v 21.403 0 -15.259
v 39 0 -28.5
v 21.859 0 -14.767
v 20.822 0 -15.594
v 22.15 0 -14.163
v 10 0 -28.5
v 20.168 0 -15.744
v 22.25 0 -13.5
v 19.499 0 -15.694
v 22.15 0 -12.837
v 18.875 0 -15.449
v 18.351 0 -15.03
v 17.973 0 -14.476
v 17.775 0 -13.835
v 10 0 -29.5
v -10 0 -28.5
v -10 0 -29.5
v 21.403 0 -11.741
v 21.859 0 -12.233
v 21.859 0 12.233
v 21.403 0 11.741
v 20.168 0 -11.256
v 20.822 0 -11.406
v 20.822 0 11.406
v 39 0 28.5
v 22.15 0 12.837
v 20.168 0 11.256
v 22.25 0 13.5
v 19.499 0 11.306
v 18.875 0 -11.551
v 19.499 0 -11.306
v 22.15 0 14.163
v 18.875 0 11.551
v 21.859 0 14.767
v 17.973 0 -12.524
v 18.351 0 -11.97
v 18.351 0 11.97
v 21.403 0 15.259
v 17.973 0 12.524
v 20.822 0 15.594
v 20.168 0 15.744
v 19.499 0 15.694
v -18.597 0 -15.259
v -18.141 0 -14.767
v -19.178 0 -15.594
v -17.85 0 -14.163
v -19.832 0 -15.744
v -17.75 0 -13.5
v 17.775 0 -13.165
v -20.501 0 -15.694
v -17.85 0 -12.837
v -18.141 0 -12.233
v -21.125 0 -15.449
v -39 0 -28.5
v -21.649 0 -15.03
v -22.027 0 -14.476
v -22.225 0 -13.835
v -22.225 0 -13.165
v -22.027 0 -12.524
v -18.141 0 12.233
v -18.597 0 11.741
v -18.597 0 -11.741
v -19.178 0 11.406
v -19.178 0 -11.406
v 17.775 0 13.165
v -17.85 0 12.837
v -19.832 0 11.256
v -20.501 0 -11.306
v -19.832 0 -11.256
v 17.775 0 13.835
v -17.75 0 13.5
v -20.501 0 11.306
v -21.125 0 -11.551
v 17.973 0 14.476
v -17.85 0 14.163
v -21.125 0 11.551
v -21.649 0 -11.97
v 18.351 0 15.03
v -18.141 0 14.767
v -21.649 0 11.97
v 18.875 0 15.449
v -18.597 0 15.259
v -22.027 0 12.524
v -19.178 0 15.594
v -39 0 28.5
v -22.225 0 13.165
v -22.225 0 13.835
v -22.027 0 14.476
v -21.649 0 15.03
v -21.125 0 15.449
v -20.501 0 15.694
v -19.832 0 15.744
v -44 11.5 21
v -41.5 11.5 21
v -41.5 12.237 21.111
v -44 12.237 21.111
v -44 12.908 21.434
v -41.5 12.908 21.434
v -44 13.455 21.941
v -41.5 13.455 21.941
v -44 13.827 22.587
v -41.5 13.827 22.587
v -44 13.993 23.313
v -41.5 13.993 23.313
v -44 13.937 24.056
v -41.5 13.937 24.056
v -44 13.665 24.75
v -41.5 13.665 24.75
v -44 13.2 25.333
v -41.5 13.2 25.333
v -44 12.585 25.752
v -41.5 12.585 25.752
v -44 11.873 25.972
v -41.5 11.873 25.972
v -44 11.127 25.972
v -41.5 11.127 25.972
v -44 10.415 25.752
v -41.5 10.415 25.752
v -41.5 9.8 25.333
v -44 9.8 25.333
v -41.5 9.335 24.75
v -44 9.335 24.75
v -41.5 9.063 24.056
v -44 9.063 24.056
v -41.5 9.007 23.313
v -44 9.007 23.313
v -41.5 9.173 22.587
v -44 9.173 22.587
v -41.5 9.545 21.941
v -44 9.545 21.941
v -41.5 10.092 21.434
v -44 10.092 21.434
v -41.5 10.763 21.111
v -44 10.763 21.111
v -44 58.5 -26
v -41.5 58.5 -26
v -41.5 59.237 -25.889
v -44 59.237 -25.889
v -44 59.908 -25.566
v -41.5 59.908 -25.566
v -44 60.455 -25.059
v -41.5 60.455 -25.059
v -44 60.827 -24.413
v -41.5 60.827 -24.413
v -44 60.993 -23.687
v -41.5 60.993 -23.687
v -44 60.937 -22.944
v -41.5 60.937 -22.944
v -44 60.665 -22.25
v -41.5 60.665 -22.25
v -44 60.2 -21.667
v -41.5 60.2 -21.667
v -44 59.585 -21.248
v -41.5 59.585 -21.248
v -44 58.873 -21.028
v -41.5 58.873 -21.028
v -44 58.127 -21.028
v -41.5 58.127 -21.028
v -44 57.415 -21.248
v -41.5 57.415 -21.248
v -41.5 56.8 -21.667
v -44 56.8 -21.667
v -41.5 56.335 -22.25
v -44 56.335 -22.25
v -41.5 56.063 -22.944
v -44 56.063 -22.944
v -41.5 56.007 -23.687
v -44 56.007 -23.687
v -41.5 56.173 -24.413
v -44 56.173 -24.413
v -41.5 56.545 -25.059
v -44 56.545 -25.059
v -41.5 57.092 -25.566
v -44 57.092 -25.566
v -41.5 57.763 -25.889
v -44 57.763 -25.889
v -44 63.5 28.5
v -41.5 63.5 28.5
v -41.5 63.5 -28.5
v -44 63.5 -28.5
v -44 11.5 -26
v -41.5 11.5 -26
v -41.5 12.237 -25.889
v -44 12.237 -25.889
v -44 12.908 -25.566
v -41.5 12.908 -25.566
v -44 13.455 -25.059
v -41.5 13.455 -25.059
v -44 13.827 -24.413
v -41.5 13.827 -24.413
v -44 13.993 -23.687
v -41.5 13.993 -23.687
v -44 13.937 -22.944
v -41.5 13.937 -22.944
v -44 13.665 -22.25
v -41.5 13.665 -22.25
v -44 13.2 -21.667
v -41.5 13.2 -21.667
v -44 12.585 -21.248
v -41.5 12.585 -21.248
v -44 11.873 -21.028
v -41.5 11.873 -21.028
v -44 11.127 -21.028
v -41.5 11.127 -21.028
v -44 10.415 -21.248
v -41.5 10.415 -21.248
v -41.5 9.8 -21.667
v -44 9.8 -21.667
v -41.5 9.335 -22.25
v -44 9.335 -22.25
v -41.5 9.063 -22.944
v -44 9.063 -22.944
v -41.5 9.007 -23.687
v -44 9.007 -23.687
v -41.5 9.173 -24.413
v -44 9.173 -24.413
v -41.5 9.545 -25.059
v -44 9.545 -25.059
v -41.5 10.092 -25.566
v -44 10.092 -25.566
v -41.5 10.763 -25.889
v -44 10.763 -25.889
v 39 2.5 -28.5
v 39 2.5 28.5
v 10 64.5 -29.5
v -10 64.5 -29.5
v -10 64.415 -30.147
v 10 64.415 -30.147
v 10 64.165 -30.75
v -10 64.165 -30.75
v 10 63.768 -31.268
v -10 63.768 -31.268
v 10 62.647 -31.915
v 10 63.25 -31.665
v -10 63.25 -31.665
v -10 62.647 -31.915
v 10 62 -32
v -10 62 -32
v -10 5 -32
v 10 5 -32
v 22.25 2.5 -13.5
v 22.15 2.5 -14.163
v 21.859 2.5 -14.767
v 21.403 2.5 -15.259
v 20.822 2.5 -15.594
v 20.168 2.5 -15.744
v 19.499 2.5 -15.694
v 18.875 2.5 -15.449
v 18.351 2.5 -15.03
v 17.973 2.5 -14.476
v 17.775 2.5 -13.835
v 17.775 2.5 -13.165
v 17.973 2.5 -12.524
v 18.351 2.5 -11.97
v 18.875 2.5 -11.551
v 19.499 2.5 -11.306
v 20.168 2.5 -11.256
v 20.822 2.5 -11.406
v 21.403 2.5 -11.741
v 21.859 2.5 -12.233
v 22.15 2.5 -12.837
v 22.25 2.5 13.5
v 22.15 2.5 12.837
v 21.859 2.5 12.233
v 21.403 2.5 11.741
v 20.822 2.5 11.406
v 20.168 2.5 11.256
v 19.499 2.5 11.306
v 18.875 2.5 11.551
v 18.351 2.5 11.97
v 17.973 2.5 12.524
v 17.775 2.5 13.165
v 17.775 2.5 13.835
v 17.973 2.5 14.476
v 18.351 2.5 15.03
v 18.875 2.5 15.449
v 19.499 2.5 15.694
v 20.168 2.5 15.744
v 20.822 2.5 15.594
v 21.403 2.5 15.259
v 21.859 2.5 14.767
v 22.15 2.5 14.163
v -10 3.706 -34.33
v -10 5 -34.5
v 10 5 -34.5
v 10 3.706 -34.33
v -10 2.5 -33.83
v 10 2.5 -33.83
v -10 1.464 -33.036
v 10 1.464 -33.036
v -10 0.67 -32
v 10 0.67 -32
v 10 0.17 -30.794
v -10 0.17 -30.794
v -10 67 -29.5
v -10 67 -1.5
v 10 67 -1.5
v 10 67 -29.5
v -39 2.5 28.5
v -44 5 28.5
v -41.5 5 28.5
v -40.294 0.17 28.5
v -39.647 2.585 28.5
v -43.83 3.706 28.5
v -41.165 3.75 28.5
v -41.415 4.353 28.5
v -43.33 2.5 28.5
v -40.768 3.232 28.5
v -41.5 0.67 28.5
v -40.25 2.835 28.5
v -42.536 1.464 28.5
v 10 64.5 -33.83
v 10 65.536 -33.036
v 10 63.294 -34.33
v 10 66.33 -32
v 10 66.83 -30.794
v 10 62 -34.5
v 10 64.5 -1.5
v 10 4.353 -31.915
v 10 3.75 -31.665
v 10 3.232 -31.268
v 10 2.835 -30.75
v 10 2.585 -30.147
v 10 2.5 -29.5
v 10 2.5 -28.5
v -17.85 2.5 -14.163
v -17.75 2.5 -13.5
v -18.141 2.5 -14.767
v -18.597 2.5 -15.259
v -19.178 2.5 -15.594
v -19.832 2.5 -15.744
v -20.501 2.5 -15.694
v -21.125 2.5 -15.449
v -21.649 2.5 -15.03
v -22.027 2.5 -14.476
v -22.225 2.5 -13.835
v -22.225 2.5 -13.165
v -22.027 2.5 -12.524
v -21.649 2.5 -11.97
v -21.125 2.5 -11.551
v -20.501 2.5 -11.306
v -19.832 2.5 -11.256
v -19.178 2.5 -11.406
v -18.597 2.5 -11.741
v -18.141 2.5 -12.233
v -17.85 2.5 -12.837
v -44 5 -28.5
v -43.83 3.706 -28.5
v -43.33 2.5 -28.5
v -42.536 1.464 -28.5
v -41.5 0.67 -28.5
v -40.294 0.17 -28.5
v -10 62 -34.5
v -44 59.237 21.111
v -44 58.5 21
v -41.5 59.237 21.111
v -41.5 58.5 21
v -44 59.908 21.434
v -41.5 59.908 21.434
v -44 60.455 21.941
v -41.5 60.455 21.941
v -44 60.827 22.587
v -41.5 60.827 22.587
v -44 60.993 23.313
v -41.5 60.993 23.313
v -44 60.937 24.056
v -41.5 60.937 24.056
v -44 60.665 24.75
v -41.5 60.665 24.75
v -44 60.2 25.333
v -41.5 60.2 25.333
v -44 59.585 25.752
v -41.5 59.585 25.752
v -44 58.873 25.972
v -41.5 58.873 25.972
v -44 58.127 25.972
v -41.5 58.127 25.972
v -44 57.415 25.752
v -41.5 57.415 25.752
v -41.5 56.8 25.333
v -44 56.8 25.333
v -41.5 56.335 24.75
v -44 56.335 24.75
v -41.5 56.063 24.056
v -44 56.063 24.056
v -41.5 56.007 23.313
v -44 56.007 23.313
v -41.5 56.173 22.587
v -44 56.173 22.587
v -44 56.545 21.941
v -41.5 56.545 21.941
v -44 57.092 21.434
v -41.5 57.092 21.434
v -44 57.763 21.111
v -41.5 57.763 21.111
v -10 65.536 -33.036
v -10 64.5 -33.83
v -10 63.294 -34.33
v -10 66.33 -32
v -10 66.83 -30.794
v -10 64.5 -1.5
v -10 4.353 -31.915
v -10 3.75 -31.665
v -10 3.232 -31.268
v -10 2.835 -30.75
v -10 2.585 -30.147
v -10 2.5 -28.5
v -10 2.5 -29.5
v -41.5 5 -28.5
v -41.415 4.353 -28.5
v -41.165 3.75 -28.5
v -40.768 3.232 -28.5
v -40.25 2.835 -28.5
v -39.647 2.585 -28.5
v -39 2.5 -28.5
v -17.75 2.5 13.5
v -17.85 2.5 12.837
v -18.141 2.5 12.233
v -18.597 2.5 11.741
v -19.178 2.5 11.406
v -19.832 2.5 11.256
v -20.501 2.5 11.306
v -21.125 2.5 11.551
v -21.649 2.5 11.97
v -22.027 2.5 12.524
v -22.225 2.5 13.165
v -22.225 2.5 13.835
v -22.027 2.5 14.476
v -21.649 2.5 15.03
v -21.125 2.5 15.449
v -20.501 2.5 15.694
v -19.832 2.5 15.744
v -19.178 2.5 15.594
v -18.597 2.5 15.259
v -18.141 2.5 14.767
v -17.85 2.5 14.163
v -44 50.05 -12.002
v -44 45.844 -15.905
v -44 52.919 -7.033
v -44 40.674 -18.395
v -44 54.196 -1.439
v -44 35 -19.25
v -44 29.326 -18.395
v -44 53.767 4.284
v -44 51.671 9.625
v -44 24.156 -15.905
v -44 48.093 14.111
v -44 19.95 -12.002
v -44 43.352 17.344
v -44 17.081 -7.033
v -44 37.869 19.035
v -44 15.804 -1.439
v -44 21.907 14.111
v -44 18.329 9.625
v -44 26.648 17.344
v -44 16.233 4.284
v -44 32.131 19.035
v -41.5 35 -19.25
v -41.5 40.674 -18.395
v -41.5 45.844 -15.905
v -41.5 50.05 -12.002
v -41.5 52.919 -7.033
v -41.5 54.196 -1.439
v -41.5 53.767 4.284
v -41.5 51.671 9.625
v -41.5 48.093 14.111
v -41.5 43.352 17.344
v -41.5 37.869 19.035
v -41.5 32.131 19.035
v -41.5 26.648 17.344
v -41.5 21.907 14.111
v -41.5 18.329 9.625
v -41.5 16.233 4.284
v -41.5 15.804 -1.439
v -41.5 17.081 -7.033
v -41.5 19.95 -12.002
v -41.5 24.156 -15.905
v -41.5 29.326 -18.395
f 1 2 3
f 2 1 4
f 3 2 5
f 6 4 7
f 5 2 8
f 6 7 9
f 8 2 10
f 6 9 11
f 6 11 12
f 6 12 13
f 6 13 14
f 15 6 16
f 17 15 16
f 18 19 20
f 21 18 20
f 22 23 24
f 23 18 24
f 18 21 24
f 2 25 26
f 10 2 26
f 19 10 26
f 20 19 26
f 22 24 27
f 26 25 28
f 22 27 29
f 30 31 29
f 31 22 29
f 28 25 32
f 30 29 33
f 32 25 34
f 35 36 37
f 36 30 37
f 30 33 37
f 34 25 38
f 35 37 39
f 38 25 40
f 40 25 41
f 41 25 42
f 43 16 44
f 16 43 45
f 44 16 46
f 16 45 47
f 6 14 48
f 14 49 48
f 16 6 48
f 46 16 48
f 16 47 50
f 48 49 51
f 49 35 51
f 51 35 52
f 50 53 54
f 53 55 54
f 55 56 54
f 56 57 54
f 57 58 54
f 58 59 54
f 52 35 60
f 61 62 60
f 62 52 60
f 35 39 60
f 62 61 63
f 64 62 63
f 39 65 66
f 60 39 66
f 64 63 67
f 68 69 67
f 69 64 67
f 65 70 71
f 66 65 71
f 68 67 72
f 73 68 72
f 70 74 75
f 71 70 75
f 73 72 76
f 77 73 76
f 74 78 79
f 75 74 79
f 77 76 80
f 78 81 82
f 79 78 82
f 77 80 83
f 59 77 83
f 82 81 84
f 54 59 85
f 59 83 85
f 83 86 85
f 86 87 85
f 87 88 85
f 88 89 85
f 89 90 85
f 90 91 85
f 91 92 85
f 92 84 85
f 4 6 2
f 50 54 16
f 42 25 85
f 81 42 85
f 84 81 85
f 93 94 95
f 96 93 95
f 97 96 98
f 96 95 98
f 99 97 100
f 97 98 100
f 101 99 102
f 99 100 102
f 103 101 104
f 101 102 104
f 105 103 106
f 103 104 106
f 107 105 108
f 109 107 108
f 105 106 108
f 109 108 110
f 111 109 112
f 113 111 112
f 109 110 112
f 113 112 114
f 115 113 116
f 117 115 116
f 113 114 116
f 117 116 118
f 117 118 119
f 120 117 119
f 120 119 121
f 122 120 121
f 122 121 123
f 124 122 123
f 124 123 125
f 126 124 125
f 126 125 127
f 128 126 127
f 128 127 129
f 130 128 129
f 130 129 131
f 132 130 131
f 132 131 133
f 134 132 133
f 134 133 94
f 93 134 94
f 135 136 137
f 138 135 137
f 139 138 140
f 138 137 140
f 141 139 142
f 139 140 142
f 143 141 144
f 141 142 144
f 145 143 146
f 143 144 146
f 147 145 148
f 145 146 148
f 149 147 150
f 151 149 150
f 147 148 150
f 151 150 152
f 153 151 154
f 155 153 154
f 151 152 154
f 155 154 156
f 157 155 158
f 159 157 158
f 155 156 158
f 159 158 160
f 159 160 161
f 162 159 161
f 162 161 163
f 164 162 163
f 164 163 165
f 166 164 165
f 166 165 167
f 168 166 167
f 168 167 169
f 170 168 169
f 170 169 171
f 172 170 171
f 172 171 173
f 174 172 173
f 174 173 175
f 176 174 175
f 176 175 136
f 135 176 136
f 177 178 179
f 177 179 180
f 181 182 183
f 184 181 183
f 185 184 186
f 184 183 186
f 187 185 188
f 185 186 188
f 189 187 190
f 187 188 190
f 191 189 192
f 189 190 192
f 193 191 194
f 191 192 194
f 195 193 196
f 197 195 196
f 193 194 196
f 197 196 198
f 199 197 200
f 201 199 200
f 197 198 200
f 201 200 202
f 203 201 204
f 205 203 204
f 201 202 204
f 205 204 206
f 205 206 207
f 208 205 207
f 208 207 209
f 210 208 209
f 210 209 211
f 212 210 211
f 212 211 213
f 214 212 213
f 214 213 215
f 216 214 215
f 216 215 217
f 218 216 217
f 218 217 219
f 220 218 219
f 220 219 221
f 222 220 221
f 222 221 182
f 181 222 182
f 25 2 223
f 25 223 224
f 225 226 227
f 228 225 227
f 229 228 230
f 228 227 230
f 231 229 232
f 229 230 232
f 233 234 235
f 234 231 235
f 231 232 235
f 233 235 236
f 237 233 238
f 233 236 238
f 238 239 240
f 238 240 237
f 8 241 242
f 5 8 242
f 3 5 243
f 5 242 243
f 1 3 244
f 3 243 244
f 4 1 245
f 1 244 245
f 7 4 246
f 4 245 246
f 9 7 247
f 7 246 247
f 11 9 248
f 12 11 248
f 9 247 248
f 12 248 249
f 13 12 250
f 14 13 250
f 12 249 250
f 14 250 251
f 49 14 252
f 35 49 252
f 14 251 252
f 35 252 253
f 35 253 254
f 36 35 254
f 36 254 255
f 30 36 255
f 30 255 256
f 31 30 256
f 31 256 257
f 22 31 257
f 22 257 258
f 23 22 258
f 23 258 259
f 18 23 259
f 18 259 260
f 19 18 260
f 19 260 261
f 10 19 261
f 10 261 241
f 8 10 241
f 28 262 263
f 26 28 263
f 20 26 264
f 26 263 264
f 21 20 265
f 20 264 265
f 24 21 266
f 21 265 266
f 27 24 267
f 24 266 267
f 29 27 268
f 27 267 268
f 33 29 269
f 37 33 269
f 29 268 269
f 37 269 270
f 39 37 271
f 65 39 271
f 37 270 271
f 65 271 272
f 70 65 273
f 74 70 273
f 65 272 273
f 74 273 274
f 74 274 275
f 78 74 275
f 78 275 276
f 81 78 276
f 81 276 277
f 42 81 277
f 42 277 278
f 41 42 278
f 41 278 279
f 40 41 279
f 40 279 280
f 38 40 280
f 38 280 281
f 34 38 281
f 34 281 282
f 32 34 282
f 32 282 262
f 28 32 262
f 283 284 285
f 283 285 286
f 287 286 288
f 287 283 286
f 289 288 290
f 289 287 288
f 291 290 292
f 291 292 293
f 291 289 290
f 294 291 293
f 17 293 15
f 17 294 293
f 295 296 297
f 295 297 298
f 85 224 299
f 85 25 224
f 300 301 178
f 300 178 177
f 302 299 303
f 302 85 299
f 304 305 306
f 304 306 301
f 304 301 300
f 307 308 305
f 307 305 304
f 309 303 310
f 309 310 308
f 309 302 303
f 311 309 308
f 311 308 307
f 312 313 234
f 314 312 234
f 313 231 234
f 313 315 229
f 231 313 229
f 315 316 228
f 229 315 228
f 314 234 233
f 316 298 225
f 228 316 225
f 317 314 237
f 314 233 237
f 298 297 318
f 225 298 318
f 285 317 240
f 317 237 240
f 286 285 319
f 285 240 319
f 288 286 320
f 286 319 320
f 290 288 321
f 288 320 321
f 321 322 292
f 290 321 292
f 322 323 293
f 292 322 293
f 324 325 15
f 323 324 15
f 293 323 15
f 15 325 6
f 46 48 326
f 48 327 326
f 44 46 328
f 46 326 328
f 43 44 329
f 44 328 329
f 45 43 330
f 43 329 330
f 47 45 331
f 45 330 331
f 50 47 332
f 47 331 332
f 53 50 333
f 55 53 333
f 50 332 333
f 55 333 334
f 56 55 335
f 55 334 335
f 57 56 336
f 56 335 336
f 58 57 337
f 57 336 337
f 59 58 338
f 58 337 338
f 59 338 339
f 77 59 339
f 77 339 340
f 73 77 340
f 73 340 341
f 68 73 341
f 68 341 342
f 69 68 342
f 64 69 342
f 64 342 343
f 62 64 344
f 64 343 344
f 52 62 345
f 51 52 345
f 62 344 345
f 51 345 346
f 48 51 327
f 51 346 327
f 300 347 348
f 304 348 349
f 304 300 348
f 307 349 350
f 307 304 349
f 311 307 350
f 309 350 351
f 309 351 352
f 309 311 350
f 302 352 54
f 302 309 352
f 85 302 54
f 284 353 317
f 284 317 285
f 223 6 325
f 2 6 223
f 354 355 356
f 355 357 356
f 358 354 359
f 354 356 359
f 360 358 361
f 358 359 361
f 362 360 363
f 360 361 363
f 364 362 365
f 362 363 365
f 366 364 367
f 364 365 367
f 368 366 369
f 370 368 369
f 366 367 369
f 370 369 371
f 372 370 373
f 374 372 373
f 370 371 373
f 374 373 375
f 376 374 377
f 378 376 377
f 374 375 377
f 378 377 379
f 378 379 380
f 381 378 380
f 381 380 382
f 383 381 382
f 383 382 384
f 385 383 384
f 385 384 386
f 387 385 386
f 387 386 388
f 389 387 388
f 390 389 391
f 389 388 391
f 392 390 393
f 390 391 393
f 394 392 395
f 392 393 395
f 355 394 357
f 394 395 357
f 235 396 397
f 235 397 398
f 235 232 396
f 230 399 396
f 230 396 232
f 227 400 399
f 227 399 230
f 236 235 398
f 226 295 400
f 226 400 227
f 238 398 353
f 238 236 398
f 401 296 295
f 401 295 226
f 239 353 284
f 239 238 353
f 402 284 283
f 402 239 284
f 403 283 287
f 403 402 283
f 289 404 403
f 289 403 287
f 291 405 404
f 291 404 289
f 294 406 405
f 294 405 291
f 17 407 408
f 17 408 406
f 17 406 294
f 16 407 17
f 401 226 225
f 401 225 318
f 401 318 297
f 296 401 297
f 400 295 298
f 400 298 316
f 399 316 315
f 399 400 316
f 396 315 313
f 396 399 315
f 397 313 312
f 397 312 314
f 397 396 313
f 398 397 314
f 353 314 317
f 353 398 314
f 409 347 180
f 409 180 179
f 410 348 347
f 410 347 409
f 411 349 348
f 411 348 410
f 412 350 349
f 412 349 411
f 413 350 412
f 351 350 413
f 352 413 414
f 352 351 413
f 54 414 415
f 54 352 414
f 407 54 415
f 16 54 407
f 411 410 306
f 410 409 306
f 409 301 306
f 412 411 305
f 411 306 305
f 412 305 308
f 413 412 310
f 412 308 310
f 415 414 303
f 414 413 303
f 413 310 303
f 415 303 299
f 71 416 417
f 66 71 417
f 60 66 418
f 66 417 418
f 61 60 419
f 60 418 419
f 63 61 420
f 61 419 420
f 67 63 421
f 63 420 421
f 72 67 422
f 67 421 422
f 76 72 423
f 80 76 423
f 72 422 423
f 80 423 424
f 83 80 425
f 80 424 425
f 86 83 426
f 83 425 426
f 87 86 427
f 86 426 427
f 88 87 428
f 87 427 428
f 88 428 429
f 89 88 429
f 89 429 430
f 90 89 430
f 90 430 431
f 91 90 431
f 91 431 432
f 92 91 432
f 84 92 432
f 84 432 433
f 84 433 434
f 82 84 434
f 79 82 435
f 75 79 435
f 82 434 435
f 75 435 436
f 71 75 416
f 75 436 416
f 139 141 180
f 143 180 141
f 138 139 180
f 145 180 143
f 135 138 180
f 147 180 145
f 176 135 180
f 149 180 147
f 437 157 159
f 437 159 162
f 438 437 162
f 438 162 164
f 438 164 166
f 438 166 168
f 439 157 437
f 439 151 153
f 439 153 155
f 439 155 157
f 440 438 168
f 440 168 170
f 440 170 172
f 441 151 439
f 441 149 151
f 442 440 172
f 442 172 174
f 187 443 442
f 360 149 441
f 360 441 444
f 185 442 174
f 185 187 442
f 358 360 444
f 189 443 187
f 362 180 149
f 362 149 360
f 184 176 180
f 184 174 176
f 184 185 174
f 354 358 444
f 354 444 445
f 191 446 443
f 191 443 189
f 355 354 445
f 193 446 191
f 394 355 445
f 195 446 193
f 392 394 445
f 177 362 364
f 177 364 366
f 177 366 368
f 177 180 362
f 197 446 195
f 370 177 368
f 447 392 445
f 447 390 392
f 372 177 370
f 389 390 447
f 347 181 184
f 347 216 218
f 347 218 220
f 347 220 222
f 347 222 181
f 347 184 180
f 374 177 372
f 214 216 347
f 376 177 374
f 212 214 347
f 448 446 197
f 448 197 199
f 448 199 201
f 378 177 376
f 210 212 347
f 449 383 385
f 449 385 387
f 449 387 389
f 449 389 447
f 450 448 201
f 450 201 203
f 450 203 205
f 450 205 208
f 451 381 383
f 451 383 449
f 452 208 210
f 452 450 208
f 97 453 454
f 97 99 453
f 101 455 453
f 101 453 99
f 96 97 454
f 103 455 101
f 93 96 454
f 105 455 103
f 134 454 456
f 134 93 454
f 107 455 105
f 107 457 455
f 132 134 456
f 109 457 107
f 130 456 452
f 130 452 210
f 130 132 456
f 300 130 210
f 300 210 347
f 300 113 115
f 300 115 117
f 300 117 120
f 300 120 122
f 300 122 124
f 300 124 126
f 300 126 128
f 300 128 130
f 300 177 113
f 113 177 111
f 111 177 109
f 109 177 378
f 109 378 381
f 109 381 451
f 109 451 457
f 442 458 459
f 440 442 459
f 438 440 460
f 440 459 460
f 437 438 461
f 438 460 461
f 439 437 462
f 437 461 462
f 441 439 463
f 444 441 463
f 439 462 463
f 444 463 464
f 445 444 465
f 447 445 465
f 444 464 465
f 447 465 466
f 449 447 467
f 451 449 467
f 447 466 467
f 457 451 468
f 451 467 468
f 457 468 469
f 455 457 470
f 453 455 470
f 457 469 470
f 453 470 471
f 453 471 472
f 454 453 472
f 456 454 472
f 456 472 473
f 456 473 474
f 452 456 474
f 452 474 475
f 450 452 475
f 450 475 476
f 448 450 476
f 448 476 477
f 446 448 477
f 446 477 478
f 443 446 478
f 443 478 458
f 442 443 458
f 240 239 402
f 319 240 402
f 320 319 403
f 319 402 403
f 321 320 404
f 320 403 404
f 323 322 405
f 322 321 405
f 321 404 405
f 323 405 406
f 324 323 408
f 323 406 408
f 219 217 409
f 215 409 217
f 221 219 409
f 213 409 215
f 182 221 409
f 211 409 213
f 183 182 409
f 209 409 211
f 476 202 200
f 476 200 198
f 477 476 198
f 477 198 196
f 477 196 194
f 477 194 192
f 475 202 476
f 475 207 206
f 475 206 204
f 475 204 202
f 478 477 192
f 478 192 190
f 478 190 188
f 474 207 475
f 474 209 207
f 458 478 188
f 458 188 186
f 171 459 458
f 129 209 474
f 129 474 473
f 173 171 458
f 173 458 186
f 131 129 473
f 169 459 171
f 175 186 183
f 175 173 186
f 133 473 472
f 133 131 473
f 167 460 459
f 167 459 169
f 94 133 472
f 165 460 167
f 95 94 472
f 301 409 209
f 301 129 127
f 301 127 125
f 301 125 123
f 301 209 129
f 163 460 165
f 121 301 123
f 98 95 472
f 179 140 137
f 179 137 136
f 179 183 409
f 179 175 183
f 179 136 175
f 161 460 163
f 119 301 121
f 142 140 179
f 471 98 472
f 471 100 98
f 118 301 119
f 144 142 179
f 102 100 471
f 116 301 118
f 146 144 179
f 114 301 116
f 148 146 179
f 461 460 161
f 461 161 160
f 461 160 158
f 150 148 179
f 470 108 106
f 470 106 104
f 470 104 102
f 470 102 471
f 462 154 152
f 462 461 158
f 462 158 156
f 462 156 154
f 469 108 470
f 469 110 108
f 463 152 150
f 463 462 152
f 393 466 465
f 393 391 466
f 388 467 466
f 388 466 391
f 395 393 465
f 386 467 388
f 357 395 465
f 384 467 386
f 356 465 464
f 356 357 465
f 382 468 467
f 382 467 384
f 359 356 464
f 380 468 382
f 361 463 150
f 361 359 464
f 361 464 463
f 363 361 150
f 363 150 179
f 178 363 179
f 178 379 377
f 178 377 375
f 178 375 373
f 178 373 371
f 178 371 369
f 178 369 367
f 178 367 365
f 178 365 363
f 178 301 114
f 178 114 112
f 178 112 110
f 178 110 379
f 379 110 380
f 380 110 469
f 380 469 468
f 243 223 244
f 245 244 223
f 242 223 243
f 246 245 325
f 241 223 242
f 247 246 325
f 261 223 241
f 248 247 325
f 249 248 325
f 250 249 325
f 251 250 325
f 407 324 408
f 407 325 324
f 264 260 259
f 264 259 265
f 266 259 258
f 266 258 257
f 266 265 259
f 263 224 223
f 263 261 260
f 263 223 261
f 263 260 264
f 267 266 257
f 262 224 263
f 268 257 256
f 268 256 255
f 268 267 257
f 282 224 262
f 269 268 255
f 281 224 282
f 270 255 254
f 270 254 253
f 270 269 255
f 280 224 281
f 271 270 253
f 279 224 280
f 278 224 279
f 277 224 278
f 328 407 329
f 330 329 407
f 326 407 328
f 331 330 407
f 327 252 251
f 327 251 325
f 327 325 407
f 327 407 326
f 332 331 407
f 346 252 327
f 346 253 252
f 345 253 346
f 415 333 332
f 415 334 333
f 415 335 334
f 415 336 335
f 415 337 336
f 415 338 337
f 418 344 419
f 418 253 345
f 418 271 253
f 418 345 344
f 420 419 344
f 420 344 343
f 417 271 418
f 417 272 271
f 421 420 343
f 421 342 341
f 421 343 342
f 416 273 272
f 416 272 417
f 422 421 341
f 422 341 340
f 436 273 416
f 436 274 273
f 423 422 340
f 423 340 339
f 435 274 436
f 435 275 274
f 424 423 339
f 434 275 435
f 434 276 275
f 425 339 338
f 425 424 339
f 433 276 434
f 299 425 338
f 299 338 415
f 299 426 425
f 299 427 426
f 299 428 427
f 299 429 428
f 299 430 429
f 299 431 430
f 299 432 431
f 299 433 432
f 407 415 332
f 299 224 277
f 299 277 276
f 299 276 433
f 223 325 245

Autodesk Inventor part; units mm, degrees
ref_plane "YZ Plane" through (0, 0, 0) normal (1, 0, 0) x (0, 1, 0)
ref_plane "XZ Plane" through (0, 0, 0) normal (0, 1, 0) x (-1, 0, 0)
ref_plane "XY Plane" through (0, 0, 0) normal (0, 0, 1) x (1, 0, 0)
sketch "Sketch1" plane through (0, 0, 0) normal (0, 1, 0) x (-1, 0, 0)
  line L0 (39, -28.5) -> (-39, -28.5)
  line L1 (-39, -28.5) -> (-39, 28.5)
  line L2 (-39, 28.5) -> (39, 28.5)
  line L3 (39, 28.5) -> (39, -28.5)
  line L4 (39, -28.5) -> (-39, 28.5) construction
  line L5 (-39, -28.5) -> (39, 28.5) construction
  point P0 (0, 0)
  dimension "d0" = 78
  dimension "d1" = 57
extrude "Plate1" add sketch "Sketch1" along normal blind 2.5
sketch "Sketch2" plane through (-41.5, 5, 28.5) normal (-1, 0, 0) x (0, -1, 0)
  line L0 (0, -57) -> (0, 0)
  line L1 (0, 0) -> (-58.5, 0)
  line L2 (-58.5, 0) -> (-58.5, -57)
  line L3 (-58.5, -57) -> (0, -57)
edge flange "Flange1" height 63.5 angle 90 thickness 2.5 bend radius 2.5 thickness toward (-1, 0, 0) relief tear relief width 2.5 relief depth 1.25 edges at (-39, 2.5, 0) wall of the first edge with corners at (-41.5, 5, -28.5) (-41.5, 5, 28.5) (-41.5, 63.5, 28.5) (-41.5, 63.5, -28.5)
bend "Bend1"
corner "Corner1"
sketch "Sketch3" plane through (-41.5, 63.5, 28.5) normal (1, 0, 0) x (0, 0, -1)
  line L0 (57, 0) -> (57, -58.5) projected
  line L1 (0, 0) -> (57, 0)
  line L2 (57, 0) -> (57, -57)
  line L3 (57, -57) -> (0, -57)
  line L4 (0, -57) -> (0, 0)
  line L5 (0, 0) -> (57, -57)
  circle A0 centre (28.5, -28.5) radius 19.25
  line L6 (0, 0) -> (5, 0)
  line L7 (57, 0) -> (0, 0) projected
  line L8 (5, 0) -> (5, -5)
  line L9 (57, 0) -> (52, 0)
  line L10 (52, 0) -> (52, -5)
  line L11 (57, -57) -> (52, -57)
  line L12 (52, -57) -> (52, -52)
  line L13 (0, -57) -> (5, -57)
  line L14 (5, -57) -> (5, -52)
  circle A1 centre (5, -52) radius 2.5
  circle A2 centre (52, -52) radius 2.5
  circle A3 centre (52, -5) radius 2.5
  circle A4 centre (5, -5) radius 2.5
  point P0 (28.5, -63.5)
  dimension "d13" = 57
  dimension "d14" = 38.5
  dimension "d15" = 5
  dimension "d16" = 5
  dimension "d17" = 5
  dimension "d18" = 5
  dimension "d19" = 5
  dimension "d20" = 5
  dimension "d21" = 5
  dimension "d22" = 5
  dimension "d23" = 5
  dimension "d24" = 5
  dimension "d25" = 5
  dimension "d26" = 5
extrude "Cut1" cut sketch "Sketch3" against normal blind 2.5 contours A2 L12 L5 | L5 A2 | A2 L5 L12 | A4 L5 L8 | L8 L5 A4 | L5 A4 | A0 L5 | L5 A0 | A1 | A3
sketch "Sketch4" plane through (39, 0, -28.5) normal (0, 0, -1) x (-1, 0, 0)
  line L0 (39, 0) -> (29, 0)
  line L1 (78, 0) -> (0, 0) projected
  line L2 (29, 0) -> (29, 2.5)
  line L3 (78, 2.5) -> (0, 2.5) projected
  line L4 (29, 2.5) -> (49, 2.5)
  line L5 (49, 2.5) -> (49, 0)
  line L6 (49, 0) -> (29, 0)
  line L7 (29, 0) -> (29, 2.5)
  dimension "d29" = 10
  dimension "d30" = 20
extrude "Extrusion1" add sketch "Sketch4" along normal blind 1
sketch "Sketch5" plane through (-10, 5, -32) normal (0, 0, -1) x (-1, 0, 0)
  line L0 (-20, 0) -> (0, 0)
  line L1 (0, 0) -> (0, 57)
  line L2 (0, 57) -> (-20, 57)
  line L3 (-20, 57) -> (-20, 0)
edge flange "Flange2" height 62 angle 90 thickness 2.5 bend radius 2.5 thickness toward (0, 0, -1) relief tear relief width 2.5 relief depth 1.25 edges at (0, 2.5, -29.5) wall of the first edge with corners at (10, 5, -32) (-10, 5, -32) (-10, 62, -32) (10, 62, -32)
bend "Bend2"
corner "Corner2"
sketch "Sketch6" plane through (-10, 64.5, -29.5) normal (0, 1, 0) x (-1, 0, 0)
  line L0 (-20, 0) -> (0, 0)
  line L1 (0, 0) -> (0, 28)
  line L2 (0, 28) -> (-20, 28)
  line L3 (-20, 28) -> (-20, 0)
edge flange "Flange3" height 33 angle 90 thickness 2.5 bend radius 2.5 thickness toward (0, 1, 0) relief tear relief width 2.5 relief depth 1.25 edges at (0, 62, -32) wall of the first edge with corners at (10, 64.5, -29.5) (-10, 64.5, -29.5) (-10, 64.5, -1.5) (10, 64.5, -1.5)
bend "Bend3"
corner "Corner3"
sketch "Sketch7" plane through (0, 2.5, 0) normal (0, 1, 0) x (1, 0, 0)
  line L0 (39, -28.5) -> (-39, -28.5) projected
  line L1 (0, -28.5) -> (0, -13.5)
  line L2 (0, -13.5) -> (20, -13.5)
  line L3 (0, -13.5) -> (-20, -13.5)
  circle A0 centre (-20, -13.5) radius 2.25
  circle A1 centre (20, -13.5) radius 2.25
  line L4 (0, -13.5) -> (0, 13.5)
  line L5 (0, 13.5) -> (20, 13.5)
  line L6 (0, 13.5) -> (-20, 13.5)
  circle A2 centre (-20, 13.5) radius 2.25
  circle A3 centre (20, 13.5) radius 2.25
  point P0 (0, 0)
  dimension "d53" = 15
  dimension "d54" = 20
  dimension "d55" = 20
  dimension "d56" = 4.5
  dimension "d57" = 4.5
  dimension "d58" = 27
  dimension "d59" = 20
  dimension "d60" = 20
  dimension "d61" = 4.5
  dimension "d62" = 4.5
extrude "Cut2" cut sketch "Sketch7" against normal blind 2.5
equation "\"d27\" = Thickness"
equation "\"d63\" = Thickness"
equation "\"d3\" = BendReliefWidth"
equation "\"d4\" = BendReliefDepth"
equation "\"d5\" = MinimumRemnant"
equation "\"d6\" = BendRadius"
equation "\"d9\" = BendRadius"
equation "\"d10\" = CornerReliefSize"
equation "\"d11\" = GapSize"
equation "\"d12\" = JacobiRadiusSize"
equation "\"d33\" = BendReliefWidth"
equation "\"d34\" = BendReliefDepth"
equation "\"d35\" = MinimumRemnant"
equation "\"d36\" = BendRadius"
equation "\"d39\" = BendRadius"
equation "\"d40\" = CornerReliefSize"
equation "\"d41\" = GapSize"
equation "\"d42\" = JacobiRadiusSize"
equation "\"d43\" = BendReliefWidth"
equation "\"d44\" = BendReliefDepth"
equation "\"d45\" = MinimumRemnant"
equation "\"d46\" = BendRadius"
equation "\"d49\" = BendRadius"
equation "\"d50\" = CornerReliefSize"
equation "\"d51\" = GapSize"
equation "\"d52\" = JacobiRadiusSize"
equation "\"BendRadius\" = Thickness"
equation "\"BendReliefWidth\" = Thickness"
equation "\"BendReliefDepth\" = 0.5 * Thickness"
equation "\"MinimumRemnant\" = 2 * Thickness"
equation "\"TransitionRadius\" = BendRadius"
equation "\"JacobiRadiusSize\" = BendRadius"
equation "\"GapSize\" = Thickness"
equation "\"d2\" = BendRadius"
equation "\"Thickness\" = 2.5"
equation "\"CornerReliefSize\" = 10"
properties part number "MotorClamptwo" material "Steel, Mild"
